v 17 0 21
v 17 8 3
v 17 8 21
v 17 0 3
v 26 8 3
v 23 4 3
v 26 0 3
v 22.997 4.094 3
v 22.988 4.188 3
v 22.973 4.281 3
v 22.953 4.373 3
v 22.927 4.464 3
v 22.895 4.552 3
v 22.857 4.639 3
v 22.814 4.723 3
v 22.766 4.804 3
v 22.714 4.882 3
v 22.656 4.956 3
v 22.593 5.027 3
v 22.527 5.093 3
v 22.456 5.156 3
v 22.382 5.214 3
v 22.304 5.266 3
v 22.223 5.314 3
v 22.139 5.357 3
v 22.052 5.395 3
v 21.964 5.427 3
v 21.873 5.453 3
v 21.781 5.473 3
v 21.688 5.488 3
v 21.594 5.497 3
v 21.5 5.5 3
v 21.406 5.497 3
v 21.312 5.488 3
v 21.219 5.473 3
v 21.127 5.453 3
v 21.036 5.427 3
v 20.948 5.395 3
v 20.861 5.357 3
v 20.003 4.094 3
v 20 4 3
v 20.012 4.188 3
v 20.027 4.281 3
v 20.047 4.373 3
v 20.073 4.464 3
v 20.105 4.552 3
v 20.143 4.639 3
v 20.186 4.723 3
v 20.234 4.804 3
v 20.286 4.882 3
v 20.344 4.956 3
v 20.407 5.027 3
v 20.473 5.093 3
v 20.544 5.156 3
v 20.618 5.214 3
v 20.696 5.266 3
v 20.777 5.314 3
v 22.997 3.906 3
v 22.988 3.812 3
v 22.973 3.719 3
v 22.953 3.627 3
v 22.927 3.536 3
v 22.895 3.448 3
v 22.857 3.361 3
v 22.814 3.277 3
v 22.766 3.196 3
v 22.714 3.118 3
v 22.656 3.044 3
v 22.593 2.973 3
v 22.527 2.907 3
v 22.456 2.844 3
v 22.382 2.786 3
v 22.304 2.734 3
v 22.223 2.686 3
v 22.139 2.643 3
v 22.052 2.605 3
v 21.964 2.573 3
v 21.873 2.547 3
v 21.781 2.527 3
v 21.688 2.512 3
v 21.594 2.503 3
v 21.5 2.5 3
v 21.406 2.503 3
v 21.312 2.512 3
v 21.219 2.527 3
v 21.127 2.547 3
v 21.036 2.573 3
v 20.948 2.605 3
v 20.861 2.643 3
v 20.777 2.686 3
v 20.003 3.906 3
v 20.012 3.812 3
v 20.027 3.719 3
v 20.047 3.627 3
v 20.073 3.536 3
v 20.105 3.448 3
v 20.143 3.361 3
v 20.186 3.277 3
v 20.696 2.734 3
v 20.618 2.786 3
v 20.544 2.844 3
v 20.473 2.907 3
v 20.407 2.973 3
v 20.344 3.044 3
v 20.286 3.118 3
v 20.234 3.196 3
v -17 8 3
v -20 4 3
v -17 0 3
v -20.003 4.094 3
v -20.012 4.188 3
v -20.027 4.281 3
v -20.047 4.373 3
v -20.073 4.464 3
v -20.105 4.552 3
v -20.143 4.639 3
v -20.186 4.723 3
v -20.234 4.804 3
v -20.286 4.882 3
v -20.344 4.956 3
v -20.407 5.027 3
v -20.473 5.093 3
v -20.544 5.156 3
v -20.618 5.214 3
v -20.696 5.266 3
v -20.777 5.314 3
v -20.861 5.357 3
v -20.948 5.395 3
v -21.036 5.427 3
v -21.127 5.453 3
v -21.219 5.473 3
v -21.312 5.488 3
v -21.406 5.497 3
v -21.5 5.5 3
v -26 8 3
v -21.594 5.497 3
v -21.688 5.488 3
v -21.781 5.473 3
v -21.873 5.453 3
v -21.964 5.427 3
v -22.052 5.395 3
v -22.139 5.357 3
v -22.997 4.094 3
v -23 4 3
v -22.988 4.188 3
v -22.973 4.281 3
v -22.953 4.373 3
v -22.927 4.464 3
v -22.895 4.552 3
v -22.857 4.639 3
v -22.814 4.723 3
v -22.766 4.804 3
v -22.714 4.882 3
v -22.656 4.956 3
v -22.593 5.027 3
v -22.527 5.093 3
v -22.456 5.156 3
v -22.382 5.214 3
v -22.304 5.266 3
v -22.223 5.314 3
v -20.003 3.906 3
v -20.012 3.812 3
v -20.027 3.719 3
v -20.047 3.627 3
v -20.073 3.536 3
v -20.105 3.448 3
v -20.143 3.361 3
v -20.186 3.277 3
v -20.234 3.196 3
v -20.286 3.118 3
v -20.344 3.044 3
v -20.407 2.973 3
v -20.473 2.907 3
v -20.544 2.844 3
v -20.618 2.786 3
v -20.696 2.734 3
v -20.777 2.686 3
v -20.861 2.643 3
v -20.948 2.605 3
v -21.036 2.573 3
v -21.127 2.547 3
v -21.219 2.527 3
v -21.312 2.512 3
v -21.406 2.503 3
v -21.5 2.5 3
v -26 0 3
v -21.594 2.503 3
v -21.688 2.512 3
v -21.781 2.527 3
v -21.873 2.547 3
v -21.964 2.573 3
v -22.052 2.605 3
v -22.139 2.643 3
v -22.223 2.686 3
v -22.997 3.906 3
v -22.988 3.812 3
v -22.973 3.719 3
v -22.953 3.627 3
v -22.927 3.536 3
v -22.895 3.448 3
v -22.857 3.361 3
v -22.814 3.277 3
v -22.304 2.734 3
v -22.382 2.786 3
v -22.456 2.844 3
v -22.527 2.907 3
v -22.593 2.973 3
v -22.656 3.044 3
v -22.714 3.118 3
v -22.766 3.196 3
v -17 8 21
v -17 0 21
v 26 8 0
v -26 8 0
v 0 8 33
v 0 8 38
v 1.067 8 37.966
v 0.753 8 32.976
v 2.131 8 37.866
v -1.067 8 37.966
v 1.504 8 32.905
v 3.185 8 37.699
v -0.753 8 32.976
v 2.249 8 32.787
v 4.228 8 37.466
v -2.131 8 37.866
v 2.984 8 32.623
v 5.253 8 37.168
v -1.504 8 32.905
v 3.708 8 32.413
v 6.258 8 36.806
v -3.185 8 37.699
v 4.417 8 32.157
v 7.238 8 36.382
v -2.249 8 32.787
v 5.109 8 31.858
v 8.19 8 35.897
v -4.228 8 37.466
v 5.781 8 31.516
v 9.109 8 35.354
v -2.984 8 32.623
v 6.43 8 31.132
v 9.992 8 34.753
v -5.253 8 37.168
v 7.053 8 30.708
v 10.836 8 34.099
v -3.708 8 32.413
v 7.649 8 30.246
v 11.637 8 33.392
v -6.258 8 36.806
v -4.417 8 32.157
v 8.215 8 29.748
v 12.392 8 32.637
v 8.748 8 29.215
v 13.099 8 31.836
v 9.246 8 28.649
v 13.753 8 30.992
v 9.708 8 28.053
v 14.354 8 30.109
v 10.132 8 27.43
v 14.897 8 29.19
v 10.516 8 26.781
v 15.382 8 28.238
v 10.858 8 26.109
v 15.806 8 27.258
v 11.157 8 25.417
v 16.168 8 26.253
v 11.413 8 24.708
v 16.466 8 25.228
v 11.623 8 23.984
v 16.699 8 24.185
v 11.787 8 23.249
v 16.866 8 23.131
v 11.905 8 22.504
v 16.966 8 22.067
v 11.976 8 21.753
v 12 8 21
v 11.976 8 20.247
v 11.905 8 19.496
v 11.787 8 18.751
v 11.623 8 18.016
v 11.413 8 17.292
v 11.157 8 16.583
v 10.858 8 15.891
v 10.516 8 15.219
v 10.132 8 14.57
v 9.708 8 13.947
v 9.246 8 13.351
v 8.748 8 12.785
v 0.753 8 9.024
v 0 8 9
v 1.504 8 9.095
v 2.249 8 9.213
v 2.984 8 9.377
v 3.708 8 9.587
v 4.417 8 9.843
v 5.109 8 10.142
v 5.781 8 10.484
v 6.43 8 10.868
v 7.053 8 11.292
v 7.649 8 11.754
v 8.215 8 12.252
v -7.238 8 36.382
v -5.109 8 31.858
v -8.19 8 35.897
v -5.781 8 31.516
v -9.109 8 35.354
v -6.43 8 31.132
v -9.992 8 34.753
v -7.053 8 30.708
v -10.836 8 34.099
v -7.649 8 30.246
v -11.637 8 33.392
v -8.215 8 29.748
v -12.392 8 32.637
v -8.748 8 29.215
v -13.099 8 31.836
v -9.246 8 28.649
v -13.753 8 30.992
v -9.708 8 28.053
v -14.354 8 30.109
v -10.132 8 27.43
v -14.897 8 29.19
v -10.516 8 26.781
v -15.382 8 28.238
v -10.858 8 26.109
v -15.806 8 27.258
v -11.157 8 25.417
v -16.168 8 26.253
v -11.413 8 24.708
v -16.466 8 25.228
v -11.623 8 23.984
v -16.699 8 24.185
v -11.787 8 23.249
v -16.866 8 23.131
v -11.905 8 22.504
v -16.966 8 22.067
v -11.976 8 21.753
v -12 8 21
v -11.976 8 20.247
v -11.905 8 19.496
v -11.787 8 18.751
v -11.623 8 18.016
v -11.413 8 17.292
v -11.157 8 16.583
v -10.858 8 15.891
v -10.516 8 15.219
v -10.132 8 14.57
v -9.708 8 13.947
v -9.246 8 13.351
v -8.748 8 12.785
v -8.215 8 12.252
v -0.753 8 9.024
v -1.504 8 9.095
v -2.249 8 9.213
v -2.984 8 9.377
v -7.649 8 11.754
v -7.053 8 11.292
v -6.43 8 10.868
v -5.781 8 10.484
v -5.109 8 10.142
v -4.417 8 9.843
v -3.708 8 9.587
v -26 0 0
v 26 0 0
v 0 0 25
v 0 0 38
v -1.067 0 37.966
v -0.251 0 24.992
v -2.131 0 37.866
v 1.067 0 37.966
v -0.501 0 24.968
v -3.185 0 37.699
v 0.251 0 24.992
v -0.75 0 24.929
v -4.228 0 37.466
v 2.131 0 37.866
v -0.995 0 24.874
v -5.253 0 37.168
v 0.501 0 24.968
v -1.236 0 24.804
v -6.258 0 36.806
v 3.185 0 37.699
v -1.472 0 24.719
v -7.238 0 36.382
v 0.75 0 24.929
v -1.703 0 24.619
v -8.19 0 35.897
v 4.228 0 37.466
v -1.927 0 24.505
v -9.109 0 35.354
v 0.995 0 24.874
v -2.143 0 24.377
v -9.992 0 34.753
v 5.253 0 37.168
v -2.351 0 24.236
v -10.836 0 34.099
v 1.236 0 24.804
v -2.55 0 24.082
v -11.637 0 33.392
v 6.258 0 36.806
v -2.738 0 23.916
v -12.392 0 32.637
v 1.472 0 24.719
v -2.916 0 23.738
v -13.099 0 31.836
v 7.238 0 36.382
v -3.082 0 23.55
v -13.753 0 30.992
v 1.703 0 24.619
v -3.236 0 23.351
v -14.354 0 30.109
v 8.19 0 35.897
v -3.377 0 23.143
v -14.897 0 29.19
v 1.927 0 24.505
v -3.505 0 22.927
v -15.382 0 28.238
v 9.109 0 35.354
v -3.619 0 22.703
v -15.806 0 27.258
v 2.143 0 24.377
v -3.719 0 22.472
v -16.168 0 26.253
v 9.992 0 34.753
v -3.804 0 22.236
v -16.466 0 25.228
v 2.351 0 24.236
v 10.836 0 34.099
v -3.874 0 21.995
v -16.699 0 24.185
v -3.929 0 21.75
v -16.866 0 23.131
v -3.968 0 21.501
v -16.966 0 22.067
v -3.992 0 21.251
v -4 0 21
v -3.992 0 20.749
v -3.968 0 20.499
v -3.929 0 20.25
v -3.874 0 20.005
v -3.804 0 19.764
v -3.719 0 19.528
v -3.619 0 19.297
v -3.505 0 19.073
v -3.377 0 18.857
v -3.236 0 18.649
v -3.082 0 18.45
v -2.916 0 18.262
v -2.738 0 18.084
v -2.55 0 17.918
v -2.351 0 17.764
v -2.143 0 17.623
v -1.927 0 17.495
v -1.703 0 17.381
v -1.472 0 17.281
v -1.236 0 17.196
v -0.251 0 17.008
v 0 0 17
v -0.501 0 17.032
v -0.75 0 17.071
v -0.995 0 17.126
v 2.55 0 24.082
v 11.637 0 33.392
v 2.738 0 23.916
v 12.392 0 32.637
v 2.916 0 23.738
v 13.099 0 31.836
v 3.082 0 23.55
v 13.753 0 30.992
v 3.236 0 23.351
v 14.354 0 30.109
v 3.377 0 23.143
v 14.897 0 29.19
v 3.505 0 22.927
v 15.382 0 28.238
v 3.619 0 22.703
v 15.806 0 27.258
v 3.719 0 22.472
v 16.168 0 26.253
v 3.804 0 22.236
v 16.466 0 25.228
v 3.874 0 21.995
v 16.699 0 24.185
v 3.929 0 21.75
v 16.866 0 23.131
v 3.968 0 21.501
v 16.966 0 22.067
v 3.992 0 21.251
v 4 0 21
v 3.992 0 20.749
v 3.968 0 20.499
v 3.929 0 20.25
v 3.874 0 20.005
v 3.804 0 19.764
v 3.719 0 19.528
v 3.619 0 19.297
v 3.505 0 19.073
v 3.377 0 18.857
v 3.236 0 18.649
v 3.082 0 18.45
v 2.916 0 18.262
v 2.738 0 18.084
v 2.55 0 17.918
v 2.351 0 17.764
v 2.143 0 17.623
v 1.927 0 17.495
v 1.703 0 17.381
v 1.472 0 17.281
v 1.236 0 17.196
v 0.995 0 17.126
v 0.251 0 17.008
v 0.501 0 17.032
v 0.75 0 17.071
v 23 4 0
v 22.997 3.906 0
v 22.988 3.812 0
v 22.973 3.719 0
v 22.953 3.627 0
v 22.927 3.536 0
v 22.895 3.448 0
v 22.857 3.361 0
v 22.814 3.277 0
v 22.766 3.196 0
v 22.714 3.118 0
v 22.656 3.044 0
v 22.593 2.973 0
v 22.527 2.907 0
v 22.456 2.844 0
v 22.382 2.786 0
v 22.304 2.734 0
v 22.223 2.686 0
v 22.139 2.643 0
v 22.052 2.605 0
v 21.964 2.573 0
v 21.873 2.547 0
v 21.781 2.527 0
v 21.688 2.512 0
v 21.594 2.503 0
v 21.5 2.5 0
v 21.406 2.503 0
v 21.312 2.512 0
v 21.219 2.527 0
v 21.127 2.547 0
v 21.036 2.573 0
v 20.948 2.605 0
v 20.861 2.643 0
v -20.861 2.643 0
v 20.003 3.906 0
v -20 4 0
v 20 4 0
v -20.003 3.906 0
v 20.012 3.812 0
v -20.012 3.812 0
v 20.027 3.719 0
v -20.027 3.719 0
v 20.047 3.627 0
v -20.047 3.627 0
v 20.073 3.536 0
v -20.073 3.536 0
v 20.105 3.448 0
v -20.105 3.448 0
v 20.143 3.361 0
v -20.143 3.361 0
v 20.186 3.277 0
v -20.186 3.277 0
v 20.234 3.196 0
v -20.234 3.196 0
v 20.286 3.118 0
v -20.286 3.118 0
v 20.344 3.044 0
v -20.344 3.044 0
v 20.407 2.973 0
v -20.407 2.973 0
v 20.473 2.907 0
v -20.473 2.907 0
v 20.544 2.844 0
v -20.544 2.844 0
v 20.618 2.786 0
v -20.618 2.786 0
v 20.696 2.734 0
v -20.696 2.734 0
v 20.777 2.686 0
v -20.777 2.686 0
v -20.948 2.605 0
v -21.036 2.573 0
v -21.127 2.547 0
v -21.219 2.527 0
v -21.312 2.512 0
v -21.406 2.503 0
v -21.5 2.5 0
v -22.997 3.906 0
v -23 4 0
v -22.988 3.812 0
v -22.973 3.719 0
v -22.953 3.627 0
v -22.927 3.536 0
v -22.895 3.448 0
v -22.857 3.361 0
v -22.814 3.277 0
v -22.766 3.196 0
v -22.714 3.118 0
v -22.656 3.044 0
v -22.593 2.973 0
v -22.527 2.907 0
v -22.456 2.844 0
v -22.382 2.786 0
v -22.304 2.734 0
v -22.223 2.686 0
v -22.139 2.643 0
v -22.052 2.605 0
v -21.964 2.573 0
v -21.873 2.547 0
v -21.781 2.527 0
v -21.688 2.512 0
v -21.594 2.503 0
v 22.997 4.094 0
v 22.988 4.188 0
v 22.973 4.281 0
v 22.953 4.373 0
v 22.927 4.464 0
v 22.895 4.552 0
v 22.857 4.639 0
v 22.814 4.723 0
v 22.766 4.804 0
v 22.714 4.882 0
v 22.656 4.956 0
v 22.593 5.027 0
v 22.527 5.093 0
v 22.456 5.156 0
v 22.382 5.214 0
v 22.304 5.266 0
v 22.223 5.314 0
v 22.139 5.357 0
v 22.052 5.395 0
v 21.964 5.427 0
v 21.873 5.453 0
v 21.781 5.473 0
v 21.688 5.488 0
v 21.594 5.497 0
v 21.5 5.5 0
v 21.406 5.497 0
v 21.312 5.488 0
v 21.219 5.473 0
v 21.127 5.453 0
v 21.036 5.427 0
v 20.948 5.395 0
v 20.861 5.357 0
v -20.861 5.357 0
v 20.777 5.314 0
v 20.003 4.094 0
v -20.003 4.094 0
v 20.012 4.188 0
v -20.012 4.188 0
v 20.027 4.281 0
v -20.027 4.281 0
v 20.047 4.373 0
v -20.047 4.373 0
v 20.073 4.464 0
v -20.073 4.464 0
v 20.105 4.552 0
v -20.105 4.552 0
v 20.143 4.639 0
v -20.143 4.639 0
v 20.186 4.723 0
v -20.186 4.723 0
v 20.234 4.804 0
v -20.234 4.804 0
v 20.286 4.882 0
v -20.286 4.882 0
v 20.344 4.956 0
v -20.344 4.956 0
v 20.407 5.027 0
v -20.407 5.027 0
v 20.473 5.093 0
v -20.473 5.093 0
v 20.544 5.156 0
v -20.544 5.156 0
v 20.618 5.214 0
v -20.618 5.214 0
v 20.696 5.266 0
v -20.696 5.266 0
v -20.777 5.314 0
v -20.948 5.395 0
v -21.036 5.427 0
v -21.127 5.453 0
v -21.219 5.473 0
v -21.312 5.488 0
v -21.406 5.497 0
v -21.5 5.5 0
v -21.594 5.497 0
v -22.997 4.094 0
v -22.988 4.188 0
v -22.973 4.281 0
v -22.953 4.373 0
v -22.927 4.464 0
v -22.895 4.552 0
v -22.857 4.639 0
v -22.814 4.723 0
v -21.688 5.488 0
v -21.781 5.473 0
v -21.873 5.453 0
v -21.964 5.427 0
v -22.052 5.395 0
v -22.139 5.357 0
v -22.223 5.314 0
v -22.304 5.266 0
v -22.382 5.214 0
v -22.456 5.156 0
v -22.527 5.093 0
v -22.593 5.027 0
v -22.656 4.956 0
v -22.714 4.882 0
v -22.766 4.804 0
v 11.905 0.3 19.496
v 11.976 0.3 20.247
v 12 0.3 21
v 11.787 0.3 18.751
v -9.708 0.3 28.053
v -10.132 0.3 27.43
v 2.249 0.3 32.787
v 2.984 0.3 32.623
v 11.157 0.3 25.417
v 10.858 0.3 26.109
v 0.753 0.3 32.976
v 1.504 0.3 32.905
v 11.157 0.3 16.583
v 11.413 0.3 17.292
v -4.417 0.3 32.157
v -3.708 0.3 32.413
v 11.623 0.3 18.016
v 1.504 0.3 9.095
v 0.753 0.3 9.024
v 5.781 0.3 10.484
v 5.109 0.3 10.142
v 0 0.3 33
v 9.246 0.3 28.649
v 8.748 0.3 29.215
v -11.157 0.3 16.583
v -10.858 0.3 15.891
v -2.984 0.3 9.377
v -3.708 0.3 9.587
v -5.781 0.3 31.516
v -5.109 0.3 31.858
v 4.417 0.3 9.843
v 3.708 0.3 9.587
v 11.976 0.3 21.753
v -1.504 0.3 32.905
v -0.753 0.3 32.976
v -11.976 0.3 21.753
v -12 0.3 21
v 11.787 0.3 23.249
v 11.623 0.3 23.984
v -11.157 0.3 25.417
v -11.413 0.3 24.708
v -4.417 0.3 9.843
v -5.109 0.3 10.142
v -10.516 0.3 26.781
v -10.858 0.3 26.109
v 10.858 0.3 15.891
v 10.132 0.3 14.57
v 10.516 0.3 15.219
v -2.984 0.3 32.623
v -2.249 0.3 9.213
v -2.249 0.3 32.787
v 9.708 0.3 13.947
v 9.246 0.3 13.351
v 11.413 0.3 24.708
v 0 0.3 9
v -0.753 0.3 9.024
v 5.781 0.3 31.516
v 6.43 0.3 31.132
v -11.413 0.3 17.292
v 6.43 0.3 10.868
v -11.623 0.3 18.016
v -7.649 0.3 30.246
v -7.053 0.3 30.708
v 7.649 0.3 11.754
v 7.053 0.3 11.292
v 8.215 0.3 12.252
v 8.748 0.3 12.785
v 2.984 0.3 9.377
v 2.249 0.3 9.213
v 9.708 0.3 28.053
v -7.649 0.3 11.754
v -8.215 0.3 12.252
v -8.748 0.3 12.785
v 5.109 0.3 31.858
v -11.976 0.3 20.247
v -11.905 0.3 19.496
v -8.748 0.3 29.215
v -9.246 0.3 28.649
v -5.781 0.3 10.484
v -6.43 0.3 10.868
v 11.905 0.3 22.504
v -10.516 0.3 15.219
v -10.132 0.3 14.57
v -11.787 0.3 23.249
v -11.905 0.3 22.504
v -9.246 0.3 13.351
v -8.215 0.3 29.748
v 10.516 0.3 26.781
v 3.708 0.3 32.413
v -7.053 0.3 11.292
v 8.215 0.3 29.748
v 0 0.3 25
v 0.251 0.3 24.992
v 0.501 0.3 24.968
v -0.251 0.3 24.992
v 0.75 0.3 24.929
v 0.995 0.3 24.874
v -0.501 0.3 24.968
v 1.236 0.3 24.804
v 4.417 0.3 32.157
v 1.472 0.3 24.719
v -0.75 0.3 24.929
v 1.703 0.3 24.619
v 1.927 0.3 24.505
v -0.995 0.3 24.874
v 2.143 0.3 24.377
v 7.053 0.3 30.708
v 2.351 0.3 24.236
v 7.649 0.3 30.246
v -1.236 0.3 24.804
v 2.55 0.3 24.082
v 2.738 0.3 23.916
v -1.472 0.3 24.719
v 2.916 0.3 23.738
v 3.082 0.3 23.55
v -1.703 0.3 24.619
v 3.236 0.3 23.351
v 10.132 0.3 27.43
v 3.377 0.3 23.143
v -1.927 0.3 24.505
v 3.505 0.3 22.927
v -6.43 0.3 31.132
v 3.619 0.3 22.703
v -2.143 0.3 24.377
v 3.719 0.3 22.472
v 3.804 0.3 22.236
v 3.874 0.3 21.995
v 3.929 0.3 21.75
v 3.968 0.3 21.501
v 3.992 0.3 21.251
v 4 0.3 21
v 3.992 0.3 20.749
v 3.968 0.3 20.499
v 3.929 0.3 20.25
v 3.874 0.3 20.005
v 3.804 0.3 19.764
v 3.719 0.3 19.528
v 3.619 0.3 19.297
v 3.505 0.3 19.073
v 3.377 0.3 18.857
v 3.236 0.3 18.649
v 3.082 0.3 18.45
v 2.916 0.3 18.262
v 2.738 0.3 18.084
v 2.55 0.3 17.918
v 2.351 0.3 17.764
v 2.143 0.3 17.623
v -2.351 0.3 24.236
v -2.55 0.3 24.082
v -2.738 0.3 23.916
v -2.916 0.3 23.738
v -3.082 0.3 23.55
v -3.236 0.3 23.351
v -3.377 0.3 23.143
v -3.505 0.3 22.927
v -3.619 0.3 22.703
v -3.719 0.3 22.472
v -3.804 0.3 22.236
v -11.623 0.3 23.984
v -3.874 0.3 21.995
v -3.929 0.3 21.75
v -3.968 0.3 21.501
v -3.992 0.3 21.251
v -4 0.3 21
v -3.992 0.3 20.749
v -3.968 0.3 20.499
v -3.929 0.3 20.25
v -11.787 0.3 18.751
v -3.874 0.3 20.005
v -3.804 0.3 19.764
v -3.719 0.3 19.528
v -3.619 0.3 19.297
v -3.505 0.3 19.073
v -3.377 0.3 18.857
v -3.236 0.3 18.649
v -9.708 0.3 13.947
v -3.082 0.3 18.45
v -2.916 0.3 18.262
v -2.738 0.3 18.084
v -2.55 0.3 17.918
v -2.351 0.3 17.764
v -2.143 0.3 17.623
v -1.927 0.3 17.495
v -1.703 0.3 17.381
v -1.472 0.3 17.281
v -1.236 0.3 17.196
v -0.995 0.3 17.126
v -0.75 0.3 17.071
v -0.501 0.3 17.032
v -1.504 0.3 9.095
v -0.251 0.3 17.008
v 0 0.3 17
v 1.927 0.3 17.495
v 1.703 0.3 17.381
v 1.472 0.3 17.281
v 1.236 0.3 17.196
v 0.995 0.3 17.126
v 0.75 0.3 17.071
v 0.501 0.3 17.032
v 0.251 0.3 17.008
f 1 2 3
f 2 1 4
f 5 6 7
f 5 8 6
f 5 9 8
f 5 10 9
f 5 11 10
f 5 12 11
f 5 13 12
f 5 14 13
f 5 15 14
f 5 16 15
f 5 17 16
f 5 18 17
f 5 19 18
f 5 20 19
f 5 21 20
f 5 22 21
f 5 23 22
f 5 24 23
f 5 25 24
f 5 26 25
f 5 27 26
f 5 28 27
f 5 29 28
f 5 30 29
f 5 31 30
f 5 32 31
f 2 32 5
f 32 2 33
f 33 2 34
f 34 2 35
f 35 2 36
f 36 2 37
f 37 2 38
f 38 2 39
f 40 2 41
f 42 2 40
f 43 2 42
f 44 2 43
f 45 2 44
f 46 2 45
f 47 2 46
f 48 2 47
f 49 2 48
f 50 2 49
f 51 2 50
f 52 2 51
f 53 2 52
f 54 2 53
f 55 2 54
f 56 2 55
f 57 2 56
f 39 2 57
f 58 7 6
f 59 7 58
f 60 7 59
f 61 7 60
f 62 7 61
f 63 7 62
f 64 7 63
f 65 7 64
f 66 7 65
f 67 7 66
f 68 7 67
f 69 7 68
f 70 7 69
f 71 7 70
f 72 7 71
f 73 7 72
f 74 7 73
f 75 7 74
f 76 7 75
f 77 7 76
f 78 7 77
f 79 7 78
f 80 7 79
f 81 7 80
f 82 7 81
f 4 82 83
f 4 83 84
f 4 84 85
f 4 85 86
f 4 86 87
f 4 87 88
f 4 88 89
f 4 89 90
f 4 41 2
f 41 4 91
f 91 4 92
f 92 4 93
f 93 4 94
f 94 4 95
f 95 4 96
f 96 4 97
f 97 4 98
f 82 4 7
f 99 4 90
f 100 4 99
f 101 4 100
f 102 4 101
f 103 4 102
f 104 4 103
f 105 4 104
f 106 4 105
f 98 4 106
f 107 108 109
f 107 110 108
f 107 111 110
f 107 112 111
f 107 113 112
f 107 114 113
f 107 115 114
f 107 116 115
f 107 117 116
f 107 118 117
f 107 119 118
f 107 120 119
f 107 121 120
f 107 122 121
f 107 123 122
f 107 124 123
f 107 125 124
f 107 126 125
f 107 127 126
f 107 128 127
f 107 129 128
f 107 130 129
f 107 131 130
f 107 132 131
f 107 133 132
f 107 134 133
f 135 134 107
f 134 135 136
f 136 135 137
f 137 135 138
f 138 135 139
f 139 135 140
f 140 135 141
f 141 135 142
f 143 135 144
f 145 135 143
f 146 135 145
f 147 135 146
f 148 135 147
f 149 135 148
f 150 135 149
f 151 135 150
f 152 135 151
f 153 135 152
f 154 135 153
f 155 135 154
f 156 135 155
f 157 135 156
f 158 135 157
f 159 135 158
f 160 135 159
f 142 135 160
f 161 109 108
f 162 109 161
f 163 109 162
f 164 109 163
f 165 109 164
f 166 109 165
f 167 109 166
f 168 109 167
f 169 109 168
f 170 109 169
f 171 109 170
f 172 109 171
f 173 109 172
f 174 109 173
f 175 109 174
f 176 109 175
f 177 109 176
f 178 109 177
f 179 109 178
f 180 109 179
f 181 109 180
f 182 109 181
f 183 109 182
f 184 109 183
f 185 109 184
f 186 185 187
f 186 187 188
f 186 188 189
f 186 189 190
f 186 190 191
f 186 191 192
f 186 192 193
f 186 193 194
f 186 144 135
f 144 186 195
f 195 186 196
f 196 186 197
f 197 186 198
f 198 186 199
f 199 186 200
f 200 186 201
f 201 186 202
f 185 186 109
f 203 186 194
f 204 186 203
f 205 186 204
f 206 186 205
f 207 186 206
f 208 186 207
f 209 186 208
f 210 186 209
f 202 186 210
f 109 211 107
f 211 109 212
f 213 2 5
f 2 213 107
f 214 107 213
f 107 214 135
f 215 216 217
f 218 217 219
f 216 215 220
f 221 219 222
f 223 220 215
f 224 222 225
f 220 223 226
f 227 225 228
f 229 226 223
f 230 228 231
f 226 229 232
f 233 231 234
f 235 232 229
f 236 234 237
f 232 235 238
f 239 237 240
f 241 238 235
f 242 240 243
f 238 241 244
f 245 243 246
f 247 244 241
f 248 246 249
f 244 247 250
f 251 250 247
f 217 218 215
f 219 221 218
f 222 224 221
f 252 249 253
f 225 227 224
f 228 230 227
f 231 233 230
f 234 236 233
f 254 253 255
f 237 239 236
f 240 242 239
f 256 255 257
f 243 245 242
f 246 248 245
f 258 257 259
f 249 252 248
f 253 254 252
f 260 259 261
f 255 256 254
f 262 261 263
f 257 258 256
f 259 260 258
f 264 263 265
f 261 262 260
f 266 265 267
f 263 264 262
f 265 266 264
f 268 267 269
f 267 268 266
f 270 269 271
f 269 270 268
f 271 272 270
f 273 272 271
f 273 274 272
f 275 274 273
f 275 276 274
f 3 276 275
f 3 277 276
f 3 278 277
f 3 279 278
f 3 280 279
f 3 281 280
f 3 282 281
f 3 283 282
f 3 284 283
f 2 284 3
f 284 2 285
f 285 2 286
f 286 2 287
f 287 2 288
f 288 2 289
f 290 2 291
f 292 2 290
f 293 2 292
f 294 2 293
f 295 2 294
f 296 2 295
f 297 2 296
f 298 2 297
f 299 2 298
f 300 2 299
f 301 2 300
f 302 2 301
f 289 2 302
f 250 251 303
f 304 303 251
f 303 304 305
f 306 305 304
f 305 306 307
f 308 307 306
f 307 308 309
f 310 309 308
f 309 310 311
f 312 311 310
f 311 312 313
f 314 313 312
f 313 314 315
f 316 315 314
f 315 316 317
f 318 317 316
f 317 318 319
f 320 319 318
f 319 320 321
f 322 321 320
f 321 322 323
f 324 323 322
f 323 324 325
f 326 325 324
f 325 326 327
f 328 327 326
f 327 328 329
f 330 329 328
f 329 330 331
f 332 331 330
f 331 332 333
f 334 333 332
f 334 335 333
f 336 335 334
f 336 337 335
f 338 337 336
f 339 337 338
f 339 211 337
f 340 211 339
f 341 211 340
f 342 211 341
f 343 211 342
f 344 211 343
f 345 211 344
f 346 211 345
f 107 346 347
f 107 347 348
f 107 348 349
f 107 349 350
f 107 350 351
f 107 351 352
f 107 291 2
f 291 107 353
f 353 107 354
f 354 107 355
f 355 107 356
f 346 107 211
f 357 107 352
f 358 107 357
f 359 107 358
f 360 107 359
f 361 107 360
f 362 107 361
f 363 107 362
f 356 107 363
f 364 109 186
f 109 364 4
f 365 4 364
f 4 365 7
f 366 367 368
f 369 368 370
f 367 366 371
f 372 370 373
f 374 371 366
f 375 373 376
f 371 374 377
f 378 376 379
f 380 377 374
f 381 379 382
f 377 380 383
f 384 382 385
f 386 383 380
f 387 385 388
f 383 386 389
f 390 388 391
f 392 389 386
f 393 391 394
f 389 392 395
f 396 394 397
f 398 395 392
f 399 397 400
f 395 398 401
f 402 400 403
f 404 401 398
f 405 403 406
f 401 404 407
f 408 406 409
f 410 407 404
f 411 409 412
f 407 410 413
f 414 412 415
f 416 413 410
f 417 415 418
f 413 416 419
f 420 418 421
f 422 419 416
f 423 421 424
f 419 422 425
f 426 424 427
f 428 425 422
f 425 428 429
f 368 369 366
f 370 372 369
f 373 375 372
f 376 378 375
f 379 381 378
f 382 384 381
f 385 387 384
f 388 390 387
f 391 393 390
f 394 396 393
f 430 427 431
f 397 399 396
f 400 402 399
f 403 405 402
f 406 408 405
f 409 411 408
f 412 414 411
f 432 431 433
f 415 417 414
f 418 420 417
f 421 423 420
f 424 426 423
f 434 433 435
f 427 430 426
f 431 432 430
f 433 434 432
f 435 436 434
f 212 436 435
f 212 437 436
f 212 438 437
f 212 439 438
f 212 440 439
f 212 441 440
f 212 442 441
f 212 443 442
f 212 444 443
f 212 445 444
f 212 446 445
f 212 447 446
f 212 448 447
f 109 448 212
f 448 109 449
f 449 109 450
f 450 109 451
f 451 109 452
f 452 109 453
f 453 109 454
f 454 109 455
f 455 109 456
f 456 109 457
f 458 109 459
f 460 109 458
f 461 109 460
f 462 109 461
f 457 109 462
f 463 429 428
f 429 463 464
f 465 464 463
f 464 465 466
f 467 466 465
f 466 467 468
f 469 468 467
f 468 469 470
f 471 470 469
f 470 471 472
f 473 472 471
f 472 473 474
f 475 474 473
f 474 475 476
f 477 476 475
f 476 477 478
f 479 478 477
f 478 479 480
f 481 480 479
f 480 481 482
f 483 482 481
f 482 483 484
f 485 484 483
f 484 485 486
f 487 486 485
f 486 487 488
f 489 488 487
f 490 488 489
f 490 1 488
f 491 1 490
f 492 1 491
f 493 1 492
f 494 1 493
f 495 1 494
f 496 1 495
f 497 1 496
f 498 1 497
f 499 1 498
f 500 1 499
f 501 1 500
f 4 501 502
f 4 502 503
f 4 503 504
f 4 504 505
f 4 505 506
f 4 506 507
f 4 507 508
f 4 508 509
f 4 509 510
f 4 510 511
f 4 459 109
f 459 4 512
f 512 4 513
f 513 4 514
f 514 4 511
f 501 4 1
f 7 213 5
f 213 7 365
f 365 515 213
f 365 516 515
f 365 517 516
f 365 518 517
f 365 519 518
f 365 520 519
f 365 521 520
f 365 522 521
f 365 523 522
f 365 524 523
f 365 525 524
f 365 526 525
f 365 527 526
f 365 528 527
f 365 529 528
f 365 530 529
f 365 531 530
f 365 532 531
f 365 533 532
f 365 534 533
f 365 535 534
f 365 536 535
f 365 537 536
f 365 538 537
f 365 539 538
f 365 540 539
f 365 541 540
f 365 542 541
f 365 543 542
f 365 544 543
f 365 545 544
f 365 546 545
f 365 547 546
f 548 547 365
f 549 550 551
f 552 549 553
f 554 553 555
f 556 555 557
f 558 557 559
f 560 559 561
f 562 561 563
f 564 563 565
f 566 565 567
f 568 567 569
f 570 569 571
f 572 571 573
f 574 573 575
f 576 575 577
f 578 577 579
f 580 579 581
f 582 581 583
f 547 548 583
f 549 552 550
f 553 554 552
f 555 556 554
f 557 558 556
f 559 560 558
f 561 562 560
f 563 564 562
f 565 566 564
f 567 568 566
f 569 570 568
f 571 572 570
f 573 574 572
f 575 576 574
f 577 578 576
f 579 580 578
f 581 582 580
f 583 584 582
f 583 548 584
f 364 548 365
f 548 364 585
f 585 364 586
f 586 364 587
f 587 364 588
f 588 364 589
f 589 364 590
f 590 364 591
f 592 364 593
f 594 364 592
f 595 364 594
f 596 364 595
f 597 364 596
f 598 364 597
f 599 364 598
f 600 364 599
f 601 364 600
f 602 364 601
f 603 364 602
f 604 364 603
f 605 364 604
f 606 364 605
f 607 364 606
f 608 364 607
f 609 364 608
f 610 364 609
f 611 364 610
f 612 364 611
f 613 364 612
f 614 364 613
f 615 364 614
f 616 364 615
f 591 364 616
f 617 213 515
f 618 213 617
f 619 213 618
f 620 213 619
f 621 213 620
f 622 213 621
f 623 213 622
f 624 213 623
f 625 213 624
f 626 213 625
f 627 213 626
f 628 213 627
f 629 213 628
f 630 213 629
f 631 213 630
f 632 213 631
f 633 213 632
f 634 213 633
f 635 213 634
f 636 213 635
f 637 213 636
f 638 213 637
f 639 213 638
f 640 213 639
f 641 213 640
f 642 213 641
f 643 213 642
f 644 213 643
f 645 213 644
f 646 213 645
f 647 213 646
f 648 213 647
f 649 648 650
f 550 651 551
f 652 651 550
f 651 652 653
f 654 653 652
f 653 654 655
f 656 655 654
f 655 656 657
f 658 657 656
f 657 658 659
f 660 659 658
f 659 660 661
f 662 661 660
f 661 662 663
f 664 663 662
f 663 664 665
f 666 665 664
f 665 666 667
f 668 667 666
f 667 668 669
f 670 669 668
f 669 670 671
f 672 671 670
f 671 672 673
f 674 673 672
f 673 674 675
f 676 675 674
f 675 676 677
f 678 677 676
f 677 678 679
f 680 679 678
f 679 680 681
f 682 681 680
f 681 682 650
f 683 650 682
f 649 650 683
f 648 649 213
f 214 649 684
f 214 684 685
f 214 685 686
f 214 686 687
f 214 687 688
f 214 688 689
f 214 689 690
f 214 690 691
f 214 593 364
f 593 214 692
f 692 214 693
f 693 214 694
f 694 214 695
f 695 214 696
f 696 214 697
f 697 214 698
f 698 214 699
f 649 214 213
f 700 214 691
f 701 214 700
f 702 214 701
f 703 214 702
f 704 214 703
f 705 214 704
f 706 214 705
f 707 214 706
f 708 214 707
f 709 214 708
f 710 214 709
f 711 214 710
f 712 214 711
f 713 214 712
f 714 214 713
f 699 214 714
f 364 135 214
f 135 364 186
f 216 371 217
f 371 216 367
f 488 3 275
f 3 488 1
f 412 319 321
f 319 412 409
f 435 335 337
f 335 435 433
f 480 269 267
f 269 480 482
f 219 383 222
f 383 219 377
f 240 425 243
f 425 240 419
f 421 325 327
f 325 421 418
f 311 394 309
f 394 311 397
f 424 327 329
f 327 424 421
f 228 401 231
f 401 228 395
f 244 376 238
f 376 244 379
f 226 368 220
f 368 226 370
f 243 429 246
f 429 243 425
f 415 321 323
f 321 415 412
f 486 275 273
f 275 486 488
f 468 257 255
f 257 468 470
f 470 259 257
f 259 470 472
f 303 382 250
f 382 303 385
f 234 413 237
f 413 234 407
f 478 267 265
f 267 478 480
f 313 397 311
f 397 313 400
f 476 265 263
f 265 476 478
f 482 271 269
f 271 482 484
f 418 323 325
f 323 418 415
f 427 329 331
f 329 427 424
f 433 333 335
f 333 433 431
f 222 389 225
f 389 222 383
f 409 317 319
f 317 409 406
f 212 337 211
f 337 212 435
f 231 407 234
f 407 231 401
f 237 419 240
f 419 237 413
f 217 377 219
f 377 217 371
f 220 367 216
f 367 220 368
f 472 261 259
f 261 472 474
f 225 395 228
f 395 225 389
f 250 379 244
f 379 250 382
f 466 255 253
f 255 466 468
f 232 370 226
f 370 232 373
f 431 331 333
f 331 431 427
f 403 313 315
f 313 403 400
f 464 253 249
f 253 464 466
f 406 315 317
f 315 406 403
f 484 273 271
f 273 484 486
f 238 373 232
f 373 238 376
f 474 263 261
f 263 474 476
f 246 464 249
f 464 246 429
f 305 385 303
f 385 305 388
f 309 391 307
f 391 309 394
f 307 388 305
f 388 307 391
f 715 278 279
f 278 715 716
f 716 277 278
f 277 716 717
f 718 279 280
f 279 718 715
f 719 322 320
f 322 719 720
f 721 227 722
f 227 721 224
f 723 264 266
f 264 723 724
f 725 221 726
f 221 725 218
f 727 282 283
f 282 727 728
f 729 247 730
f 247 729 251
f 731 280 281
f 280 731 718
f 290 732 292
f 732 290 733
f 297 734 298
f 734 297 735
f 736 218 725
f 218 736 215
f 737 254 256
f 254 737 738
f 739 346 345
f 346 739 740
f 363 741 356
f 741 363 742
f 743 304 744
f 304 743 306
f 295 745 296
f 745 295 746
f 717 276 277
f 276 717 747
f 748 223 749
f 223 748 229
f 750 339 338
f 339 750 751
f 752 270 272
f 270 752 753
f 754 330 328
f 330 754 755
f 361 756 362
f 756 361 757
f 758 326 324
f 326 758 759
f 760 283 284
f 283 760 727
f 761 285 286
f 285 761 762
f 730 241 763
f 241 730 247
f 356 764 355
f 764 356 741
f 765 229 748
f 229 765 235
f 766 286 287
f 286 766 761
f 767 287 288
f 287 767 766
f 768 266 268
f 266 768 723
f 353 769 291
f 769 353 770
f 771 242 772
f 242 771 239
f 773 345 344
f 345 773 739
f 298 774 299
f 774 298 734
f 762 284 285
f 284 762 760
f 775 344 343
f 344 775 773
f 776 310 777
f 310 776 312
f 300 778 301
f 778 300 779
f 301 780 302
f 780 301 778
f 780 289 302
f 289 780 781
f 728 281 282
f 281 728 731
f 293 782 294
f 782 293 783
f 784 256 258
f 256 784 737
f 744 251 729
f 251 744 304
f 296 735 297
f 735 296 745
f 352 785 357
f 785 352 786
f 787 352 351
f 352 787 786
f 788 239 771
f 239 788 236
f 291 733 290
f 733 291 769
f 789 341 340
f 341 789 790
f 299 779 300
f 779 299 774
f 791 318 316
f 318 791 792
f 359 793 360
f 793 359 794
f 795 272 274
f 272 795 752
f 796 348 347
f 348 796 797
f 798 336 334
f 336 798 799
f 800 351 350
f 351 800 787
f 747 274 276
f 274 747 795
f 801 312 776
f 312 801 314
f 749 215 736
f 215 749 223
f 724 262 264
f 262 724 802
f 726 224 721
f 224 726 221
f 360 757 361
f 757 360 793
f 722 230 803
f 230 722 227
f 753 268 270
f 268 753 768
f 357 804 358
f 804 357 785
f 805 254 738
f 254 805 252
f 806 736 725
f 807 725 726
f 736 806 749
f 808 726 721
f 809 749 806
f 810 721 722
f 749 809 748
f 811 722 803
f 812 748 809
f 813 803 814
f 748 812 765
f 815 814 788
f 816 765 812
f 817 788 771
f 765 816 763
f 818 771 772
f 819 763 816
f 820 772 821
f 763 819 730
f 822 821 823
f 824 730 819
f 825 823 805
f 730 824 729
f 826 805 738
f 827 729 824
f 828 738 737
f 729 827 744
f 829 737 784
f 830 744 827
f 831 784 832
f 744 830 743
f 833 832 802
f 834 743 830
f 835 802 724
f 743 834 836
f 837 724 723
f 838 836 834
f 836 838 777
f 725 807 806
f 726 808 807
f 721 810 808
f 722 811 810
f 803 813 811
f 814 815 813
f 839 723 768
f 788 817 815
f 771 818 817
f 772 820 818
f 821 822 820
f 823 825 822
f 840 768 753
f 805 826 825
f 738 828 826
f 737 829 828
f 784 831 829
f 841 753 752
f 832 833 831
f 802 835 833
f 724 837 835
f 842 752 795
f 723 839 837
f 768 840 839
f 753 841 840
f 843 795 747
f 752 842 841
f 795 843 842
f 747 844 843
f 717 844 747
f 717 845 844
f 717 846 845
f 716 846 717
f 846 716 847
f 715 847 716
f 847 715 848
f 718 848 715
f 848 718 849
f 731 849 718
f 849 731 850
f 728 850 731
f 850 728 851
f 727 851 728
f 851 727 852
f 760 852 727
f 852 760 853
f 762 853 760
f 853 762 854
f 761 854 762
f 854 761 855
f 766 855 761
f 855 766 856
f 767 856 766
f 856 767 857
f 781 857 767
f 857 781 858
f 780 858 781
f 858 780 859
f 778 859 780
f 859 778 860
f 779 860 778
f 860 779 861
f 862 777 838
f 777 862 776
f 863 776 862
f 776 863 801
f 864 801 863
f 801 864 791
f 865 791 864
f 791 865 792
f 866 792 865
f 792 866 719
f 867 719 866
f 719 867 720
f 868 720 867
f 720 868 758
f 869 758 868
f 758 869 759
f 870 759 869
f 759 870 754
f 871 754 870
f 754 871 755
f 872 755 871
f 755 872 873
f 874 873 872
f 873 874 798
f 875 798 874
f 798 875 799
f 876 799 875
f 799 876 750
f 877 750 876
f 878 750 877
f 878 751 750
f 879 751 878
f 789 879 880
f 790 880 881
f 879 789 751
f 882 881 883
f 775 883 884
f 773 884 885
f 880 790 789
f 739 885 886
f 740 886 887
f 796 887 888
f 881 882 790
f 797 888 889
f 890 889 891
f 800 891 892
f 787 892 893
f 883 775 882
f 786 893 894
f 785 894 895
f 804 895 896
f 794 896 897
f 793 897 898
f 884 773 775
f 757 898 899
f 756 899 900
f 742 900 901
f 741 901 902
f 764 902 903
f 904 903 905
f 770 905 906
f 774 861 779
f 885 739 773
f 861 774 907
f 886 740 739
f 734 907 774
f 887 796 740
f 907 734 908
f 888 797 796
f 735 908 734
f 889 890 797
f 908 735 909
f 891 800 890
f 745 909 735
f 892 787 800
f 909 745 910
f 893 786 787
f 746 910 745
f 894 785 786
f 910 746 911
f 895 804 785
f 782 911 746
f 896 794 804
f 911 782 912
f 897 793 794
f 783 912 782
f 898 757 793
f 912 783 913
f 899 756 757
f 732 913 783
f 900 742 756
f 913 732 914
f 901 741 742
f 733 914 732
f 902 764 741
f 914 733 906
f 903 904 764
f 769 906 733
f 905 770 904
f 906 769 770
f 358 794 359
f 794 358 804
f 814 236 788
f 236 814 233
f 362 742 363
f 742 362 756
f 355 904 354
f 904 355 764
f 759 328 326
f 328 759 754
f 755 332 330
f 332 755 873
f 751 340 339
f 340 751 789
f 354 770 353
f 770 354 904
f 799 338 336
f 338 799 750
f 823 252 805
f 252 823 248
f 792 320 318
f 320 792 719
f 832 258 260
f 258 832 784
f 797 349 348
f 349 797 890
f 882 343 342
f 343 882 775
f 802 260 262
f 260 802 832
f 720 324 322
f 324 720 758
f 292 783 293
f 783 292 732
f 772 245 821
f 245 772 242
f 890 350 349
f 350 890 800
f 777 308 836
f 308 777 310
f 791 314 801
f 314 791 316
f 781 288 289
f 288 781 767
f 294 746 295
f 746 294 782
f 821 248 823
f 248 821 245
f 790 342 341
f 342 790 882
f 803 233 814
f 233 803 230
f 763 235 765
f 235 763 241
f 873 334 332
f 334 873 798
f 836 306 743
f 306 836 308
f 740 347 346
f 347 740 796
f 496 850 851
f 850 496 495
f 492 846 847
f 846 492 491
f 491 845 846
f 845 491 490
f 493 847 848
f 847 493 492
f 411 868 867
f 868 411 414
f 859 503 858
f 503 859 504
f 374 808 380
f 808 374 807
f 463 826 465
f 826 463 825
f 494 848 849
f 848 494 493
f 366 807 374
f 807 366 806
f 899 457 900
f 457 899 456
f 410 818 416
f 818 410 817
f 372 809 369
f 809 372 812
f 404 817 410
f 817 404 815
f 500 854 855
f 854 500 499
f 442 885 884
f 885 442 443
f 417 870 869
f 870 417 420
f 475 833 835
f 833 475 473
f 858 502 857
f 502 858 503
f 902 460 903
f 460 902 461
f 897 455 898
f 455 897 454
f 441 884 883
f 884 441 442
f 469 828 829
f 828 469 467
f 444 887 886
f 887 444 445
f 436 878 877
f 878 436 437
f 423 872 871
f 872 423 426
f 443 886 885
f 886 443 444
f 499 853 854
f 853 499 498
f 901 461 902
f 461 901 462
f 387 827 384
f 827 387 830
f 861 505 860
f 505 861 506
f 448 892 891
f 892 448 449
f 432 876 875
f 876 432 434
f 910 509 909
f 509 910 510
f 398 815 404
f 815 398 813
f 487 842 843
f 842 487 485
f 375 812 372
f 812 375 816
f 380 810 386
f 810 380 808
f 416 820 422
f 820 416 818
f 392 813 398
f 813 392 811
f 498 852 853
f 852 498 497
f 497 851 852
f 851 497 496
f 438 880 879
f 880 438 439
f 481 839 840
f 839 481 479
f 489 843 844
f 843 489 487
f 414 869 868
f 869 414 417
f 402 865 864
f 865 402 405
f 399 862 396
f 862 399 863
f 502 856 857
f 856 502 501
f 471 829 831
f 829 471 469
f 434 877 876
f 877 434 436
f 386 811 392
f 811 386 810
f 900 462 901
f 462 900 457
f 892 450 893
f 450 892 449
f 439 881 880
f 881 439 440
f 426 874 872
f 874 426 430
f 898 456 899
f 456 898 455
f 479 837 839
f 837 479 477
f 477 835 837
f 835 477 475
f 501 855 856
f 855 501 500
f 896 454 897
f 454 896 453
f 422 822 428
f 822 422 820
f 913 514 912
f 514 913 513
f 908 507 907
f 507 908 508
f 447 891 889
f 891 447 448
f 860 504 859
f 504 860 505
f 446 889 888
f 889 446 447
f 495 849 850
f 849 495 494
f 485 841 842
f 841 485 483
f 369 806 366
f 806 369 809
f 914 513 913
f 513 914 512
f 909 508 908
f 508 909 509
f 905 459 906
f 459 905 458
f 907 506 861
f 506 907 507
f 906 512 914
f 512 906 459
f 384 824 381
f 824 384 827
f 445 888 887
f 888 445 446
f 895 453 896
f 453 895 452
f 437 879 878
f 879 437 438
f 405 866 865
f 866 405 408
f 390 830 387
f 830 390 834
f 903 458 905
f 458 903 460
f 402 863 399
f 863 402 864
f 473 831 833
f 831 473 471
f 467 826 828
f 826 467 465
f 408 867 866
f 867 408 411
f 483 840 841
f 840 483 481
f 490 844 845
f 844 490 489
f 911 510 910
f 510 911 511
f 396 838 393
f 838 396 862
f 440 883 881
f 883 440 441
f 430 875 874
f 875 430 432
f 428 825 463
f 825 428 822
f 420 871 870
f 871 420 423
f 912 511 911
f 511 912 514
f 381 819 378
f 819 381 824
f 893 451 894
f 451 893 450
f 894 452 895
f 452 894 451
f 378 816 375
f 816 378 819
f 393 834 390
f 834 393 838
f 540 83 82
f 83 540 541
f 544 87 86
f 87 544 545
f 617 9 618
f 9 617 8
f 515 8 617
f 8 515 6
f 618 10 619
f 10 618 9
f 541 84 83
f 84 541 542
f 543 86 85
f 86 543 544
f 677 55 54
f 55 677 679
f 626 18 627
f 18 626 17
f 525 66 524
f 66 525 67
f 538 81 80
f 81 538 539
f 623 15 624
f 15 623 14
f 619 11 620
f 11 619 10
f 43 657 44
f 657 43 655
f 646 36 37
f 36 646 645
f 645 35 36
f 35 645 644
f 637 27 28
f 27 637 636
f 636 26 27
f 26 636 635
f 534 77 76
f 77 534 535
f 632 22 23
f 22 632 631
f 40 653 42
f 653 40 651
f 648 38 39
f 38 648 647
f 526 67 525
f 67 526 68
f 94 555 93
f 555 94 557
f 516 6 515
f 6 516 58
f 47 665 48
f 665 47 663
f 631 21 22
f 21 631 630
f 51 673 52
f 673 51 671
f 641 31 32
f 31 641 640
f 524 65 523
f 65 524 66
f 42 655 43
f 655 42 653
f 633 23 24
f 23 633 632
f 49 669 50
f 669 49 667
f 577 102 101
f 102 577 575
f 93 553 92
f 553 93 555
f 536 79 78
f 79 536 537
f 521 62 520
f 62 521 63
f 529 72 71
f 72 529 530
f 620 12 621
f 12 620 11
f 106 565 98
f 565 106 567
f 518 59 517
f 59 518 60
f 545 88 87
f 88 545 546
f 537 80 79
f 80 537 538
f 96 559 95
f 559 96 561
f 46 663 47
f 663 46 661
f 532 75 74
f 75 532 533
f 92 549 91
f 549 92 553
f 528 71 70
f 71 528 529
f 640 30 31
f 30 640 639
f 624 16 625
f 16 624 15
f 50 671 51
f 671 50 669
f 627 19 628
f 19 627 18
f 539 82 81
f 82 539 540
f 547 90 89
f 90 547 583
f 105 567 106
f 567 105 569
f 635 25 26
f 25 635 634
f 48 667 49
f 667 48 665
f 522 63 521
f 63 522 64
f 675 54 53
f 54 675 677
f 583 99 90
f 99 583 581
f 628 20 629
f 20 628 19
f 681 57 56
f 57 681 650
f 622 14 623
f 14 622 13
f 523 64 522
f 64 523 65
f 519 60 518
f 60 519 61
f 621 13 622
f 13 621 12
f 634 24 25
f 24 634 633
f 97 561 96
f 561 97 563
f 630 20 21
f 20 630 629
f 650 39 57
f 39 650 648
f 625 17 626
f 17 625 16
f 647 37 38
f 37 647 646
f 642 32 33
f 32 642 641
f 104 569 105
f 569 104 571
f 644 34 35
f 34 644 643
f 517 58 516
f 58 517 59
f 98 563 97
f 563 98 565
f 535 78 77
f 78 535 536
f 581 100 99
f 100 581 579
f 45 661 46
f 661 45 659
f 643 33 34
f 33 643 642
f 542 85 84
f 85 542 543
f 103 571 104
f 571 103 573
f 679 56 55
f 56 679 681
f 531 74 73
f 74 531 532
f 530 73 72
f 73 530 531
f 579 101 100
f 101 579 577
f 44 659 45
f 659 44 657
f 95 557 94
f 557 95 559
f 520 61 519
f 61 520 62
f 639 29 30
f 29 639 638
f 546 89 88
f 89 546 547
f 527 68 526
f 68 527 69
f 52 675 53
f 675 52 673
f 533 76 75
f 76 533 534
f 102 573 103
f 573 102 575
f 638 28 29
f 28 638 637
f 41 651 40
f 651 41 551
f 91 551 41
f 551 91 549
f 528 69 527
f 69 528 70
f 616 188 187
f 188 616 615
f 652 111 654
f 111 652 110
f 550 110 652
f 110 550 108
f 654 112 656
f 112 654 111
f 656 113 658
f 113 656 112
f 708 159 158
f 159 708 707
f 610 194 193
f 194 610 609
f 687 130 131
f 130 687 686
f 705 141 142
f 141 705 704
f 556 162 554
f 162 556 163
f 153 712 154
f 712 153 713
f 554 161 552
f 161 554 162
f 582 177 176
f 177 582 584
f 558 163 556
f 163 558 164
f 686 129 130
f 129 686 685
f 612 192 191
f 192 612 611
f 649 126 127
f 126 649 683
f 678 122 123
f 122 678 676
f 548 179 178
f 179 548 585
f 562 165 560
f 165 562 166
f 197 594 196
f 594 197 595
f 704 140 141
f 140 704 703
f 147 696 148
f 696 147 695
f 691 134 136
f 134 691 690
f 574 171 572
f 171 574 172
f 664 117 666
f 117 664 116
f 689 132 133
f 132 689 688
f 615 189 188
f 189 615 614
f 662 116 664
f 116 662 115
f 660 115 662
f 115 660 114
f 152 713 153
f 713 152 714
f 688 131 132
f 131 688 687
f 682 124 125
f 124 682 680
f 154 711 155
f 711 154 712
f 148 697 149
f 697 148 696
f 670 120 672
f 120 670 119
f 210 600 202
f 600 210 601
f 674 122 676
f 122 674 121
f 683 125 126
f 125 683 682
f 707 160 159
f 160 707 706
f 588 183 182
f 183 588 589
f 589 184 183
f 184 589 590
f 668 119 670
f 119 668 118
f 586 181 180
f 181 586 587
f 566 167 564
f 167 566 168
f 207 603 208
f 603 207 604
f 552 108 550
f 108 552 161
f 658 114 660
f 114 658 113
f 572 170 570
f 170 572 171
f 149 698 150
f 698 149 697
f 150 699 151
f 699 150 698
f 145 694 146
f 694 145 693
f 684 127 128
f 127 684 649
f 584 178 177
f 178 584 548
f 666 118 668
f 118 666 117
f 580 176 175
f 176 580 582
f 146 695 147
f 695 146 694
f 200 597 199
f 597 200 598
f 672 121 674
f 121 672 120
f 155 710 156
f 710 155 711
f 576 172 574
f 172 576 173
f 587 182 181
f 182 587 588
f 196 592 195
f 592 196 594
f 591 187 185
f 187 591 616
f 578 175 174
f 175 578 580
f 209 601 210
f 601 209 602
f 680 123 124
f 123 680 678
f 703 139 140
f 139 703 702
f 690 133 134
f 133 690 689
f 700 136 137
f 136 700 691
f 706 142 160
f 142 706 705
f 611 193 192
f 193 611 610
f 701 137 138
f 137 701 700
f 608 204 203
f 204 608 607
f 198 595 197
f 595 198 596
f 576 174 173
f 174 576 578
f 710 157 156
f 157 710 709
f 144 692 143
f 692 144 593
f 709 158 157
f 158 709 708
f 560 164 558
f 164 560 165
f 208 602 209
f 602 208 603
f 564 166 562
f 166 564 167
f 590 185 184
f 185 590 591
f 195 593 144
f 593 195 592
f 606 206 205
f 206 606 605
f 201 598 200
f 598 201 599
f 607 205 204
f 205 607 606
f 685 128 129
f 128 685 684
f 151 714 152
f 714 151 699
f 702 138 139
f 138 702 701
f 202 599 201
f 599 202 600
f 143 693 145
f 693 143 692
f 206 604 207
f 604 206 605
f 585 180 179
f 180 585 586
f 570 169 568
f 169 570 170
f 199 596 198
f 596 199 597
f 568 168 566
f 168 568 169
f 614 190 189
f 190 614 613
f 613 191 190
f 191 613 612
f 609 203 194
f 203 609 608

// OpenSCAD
rollerbearingdia = 24;
rollerbearingsurrond = 5;
//the middle hole of the bearing
shaftdia = 8;
// distance from the ground to the center of the roller bearing
rollerbearinghieght = 21;
feetthickness = 3;
feetboltdia = 3;
feetboltsurrond = 3;
//the width of the whole thing
width = 8;
//thin part holding the roller bearing from falling out axially
rollerholder = .3;

difference(){
    union(){
        translate([-(rollerbearingdia + rollerbearingsurrond*2)/2, 0, feetthickness]){cube([rollerbearingdia + rollerbearingsurrond*2, width,rollerbearinghieght-feetthickness]);}
        translate([-(rollerbearingdia + rollerbearingsurrond*2 + feetboltdia * 2 + feetboltsurrond *4)/2, 0, 0]){cube([rollerbearingdia + rollerbearingsurrond*2 + feetboltdia * 2 + feetboltsurrond *4, width, feetthickness]);}
        translate([0,0,rollerbearinghieght]){rotate(a = [270,0,0]){cylinder(r = (rollerbearingdia + rollerbearingsurrond * 2)/2 , h = width, $fn = 100);}}
    }
    
    union(){
       translate([0,rollerholder,rollerbearinghieght]){rotate(a = [270,0,0]){cylinder(r = (rollerbearingdia)/2 , h = width + 1, $fn = 100);}} 
              translate([0,-.5,rollerbearinghieght]){rotate(a = [270,0,0]){cylinder(r = (shaftdia)/2 , h = width + 1, $fn = 100);}} 
              translate([rollerbearingdia/2 + rollerbearingsurrond + feetboltsurrond + feetboltdia/2, width/2, -.5]){cylinder(r = feetboltdia/2, h = feetthickness + 1, $fn = 100);}
              translate([-(rollerbearingdia/2 + rollerbearingsurrond + feetboltsurrond + feetboltdia/2), width/2, -.5]){cylinder(r = feetboltdia/2, h = feetthickness + 1, $fn = 100);}
    }
}

//integrated plastic bearing
//translate([0,.55,rollerbearinghieght]){rotate(a = [270,0,0]){import("608v2_0.stl");}}
